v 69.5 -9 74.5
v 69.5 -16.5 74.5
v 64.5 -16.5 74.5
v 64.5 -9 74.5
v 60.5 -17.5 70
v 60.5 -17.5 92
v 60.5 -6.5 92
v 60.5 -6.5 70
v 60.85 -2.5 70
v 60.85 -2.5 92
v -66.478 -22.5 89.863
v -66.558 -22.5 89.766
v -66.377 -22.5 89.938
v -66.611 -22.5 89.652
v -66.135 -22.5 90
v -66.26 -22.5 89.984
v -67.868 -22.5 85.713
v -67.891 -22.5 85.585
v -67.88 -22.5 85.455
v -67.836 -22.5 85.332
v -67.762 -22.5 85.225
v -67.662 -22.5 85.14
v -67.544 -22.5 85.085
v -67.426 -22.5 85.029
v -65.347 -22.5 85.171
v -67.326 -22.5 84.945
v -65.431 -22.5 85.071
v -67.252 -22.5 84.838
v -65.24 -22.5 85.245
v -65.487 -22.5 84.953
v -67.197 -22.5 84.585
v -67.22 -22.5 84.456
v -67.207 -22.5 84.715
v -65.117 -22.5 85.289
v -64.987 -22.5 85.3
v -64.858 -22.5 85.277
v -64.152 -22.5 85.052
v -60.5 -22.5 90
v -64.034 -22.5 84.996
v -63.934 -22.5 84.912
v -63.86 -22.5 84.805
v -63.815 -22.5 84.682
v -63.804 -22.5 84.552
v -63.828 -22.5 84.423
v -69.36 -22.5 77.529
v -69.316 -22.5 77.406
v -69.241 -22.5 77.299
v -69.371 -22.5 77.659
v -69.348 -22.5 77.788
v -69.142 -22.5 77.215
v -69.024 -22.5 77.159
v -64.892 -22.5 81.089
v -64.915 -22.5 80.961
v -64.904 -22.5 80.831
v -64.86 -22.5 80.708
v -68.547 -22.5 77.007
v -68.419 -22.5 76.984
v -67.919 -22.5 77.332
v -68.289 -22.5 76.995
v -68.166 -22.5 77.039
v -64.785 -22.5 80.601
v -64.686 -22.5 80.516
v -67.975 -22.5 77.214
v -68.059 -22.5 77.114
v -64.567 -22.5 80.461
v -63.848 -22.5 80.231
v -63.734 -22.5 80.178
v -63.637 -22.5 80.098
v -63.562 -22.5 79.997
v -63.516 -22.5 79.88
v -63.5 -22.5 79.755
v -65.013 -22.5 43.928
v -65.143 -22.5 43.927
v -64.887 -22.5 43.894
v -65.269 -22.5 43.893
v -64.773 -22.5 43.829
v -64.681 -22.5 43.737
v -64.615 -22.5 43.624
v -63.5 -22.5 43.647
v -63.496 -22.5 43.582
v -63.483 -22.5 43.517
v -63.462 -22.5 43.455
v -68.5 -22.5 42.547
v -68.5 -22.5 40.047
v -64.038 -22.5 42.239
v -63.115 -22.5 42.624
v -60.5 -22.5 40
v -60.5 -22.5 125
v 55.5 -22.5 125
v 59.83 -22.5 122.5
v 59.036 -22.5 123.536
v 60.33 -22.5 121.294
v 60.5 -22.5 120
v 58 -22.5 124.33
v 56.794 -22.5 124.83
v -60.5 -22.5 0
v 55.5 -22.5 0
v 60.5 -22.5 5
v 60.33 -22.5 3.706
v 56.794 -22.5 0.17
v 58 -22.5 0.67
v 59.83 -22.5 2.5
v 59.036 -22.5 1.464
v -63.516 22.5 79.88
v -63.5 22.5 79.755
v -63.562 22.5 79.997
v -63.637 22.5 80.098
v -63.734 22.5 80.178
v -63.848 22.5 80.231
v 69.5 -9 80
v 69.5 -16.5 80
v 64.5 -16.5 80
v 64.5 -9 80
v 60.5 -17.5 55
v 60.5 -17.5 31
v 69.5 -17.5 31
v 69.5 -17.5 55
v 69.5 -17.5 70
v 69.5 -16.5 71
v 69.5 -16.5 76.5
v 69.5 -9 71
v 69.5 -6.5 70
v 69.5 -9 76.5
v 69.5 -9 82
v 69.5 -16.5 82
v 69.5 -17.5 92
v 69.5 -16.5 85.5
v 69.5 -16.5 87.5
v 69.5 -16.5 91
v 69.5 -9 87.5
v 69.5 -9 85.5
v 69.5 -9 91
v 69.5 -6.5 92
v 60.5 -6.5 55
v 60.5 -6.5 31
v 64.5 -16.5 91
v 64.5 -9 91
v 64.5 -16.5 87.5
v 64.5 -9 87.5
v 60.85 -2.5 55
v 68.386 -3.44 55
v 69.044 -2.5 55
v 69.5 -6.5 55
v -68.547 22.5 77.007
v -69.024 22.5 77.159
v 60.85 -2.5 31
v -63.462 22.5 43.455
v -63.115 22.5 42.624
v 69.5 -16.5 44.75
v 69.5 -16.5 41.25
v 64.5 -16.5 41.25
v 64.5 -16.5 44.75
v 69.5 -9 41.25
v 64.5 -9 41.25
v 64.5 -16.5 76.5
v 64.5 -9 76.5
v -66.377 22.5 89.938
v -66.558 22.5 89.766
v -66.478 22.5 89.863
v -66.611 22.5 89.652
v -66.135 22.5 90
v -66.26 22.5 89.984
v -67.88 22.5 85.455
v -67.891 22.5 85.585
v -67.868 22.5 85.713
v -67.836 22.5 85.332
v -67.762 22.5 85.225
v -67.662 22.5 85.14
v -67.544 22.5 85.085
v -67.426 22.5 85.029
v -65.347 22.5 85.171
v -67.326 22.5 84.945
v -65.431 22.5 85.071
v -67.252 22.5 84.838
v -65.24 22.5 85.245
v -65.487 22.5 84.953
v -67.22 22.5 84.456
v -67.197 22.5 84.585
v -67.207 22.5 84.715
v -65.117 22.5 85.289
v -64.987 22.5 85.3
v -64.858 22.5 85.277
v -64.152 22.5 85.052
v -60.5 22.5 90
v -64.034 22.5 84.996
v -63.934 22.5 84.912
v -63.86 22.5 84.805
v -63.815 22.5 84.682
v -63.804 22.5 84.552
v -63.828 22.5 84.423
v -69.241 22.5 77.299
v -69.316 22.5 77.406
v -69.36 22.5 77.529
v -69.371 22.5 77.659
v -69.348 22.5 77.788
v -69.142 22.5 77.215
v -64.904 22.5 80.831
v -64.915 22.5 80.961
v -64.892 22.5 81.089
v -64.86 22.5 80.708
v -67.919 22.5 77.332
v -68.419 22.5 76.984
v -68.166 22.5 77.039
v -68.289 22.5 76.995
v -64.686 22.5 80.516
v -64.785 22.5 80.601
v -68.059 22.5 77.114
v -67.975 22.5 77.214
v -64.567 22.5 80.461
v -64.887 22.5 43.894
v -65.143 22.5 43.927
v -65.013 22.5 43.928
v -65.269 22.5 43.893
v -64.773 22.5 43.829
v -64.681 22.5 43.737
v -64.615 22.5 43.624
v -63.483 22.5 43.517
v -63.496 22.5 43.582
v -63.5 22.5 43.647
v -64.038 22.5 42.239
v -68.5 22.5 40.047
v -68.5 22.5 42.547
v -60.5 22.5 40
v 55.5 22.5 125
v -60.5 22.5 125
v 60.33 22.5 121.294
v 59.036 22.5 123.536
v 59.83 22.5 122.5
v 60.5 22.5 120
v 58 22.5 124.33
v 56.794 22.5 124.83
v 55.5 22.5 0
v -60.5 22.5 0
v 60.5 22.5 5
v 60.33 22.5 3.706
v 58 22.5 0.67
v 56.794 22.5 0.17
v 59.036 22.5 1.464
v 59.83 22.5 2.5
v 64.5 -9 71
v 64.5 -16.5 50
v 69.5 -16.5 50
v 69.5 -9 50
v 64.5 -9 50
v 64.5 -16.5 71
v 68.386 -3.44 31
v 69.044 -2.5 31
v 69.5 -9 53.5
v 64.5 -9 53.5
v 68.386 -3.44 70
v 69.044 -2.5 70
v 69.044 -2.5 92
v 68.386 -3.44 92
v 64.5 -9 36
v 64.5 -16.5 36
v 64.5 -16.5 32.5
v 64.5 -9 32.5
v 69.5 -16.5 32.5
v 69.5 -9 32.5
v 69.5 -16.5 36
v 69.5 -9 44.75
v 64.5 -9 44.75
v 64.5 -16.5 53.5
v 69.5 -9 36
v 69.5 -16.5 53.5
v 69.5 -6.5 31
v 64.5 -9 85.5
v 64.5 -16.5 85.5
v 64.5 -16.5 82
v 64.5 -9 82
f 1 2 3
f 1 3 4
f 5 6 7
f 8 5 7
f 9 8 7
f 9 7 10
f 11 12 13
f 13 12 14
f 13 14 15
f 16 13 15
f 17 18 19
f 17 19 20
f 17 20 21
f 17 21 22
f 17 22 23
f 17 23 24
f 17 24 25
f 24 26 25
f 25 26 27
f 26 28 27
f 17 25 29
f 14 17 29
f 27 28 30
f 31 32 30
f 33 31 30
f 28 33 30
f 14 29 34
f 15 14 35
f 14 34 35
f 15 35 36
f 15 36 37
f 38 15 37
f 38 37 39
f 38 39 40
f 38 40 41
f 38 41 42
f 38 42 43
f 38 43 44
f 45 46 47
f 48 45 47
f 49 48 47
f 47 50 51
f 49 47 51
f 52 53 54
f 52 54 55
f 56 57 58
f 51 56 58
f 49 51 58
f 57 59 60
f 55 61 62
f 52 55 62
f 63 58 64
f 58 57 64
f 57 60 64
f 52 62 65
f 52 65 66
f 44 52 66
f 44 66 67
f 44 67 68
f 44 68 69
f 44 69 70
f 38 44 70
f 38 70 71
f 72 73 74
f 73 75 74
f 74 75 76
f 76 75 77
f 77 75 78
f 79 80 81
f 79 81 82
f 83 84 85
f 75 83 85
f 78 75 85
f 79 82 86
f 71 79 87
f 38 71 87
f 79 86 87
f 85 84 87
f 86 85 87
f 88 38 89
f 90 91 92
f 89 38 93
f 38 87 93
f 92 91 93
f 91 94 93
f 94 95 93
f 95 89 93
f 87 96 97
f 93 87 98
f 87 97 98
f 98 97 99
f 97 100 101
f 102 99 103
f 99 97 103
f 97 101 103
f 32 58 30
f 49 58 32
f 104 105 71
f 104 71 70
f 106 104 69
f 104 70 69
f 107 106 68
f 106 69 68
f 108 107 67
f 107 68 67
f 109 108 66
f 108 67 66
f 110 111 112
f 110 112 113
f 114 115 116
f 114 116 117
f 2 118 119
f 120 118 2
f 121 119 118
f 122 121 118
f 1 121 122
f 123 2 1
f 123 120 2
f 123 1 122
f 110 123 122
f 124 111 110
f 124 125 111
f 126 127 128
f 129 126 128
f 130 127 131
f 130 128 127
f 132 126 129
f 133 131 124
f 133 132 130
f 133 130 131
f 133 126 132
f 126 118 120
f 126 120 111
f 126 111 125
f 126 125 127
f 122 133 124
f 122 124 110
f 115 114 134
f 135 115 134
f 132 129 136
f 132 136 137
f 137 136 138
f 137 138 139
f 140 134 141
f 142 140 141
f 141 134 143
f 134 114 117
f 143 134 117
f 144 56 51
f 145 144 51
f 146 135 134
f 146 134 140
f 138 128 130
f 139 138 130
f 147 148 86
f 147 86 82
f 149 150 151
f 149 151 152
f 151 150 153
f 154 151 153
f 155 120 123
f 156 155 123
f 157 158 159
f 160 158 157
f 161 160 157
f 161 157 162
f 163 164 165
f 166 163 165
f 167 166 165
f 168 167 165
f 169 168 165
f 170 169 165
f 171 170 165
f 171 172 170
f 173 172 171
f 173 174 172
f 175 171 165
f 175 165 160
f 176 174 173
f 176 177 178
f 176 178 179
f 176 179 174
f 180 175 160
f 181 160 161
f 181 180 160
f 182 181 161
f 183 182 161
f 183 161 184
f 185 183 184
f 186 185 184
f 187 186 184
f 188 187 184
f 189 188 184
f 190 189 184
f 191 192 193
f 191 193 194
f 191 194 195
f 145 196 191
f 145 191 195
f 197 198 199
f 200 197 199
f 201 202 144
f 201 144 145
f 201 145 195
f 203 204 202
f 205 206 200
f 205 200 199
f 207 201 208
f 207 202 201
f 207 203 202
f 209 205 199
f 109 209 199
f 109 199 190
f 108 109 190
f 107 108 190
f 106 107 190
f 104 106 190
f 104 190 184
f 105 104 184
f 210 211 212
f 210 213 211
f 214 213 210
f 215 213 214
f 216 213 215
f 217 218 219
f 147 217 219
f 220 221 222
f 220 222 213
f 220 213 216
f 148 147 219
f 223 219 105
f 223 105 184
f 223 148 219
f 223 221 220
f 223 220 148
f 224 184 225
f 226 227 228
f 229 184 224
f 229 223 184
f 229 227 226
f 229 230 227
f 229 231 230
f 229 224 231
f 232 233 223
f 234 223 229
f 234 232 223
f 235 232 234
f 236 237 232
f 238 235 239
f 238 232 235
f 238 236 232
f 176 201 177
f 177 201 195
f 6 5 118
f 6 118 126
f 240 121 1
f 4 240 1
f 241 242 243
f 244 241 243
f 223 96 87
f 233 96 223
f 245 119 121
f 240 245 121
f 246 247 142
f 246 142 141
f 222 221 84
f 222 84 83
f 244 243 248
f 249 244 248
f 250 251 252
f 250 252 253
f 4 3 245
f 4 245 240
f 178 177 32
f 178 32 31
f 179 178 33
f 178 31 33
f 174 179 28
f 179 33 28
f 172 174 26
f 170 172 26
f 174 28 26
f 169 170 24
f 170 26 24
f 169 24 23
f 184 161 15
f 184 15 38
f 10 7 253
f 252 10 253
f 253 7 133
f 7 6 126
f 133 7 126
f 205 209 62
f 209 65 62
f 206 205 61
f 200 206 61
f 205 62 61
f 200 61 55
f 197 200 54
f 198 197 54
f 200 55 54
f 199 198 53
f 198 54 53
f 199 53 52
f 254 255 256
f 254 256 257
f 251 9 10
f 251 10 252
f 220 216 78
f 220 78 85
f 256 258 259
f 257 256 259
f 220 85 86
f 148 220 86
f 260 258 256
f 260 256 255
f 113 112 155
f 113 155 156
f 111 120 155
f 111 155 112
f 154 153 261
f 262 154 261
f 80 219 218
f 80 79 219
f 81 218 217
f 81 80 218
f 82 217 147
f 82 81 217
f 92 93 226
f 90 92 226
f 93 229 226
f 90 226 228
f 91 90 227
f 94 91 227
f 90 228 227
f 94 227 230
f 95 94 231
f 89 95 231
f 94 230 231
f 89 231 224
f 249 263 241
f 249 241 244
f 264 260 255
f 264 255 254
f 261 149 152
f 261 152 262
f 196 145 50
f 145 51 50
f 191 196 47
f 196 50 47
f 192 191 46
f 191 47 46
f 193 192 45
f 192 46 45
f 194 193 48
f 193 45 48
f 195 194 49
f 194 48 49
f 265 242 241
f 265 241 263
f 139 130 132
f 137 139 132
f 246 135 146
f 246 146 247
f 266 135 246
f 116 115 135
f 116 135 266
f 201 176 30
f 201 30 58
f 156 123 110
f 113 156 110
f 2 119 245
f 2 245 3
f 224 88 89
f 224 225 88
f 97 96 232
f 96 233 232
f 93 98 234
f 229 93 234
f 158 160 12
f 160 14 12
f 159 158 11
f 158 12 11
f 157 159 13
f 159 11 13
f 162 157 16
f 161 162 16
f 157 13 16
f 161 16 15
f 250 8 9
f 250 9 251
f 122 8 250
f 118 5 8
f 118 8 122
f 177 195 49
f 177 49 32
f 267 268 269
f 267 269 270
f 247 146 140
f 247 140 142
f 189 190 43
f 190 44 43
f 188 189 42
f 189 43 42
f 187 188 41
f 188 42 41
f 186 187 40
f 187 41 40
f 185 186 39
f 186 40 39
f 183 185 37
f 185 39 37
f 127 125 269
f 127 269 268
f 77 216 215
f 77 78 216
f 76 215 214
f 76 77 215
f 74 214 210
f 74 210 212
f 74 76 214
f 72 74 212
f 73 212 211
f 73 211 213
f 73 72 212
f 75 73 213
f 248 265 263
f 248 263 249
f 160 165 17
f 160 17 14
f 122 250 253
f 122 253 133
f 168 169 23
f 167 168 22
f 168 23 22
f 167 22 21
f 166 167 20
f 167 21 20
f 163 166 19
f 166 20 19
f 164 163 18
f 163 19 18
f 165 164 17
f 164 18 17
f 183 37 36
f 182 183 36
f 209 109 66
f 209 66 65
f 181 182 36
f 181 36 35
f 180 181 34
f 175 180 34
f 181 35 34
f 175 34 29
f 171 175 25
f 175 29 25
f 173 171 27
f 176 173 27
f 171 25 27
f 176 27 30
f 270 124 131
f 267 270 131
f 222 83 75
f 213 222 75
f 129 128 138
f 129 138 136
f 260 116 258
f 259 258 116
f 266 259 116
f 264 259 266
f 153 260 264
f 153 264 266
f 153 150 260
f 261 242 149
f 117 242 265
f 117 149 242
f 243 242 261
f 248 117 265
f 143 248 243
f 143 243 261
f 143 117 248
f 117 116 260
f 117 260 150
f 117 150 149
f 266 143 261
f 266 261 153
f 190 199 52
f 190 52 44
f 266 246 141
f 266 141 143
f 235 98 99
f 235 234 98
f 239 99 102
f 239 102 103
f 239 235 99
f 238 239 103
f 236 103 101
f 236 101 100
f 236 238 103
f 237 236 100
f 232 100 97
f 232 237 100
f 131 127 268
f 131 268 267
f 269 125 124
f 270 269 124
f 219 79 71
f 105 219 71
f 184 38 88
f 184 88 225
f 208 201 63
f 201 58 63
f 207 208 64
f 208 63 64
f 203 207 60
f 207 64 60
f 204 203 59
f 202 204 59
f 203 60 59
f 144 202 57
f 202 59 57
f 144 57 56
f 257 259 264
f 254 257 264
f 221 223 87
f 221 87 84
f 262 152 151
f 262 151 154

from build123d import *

# Parameters (mm, degrees)
F0_W      = 121
F0_H      = 45
F1_DEPTH  = 125
F2_R      = 5
F3_W      = 11
F3_H      = 22
F4_DEPTH  = 9
F3_H_2    = 24
F6_DEPTH  = 22
F8_DEPTH  = 24
F9_W      = 7.5
F9_H      = 3.5
F10_DEPTH = 5
F11_DEPTH = 5
F13_DEPTH = 45
F14_R     = 0.5
F15_R     = 0.49999


# Not quite as in the source:
# - a fillet or chamfer is up to 0.001 mm smaller than in the source, because OpenCascade refuses the exact size
# - a feature names something its author has since deleted; it is built from what else it names


with BuildPart() as f1:
    # F0 (on Top) → F1 (new body)
    with BuildSketch(Plane.XY):
        Rectangle(F0_W, F0_H)
    extrude(amount=F1_DEPTH)

    # F2
    f2_edges = [f1.edges().sort_by_distance(p)[0] for p in [
        (60.5, 0, 125),
        (60.5, 0, 0),
    ]]
    fillet(f2_edges, radius=F2_R)

    # F12 (on face) → F13 (join, through all)
    with BuildSketch(Plane(origin=(0, 22.5, 0), x_dir=(-1, 0, 0), z_dir=(0, 1, 0))):
        Polygon((60.5, 90), (60.5, 40), (68.4998644438, 40.0465712465), (68.4998644438, 42.5465712465), (64.8077652628, 44.0855331166), (64.0382843277, 42.2394835261), (63.1152595325, 42.6242239936), (63.5, 43.5472487889), (63.5, 80.1200936495), (65.0437947471, 80.6128124606), (63.6755676946, 84.8997641436), (65.3345620006, 85.4292501414), (68.0710161057, 76.8553467754), (69.5, 77.3114224596), (67.067596351, 84.9326698961), (68.0202522806, 85.2367203522), (66.5, 90), align=None)
    extrude(amount=-F13_DEPTH)

    # F14
    f14_edges = [f1.edges().sort_by_distance(p)[0] for p in [
        (-67.067596, 0, 84.93267),
        (-63.675568, 0, 84.899764),
        (-63.5, 0, 80.120094),
    ]]
    fillet(f14_edges, radius=F14_R)

    # F15 (radius 0.5 in the source; OpenCascade refuses exactly that, so slightly less here)
    f15_edges = [f1.edges().sort_by_distance(p)[0] for p in [
        (-68.020252, 0, 85.23672),
        (-69.5, 0, 77.311422),
        (-68.071016, 0, 76.855347),
        (-65.334562, 0, 85.42925),
        (-66.5, 0, 90),
        (-65.043795, 0, 80.612812),
        (-64.807765, 0, 44.085533),
        (-63.5, 0, 43.547249),
    ]]
    fillet(f15_edges, radius=F15_R)


with BuildPart() as f4:
    # F3 (on face) → F4 (new body)
    with BuildSketch(Plane.YZ.offset(60.5)):
        with Locations((-12, 81)):
            Rectangle(F3_W, F3_H)
    extrude(amount=F4_DEPTH)

    # F5 (on face) → F6 (join, through all)
    with BuildSketch(Plane(origin=(0, 0, 70), x_dir=(1, 0, 0), z_dir=(0, 0, -1))):
        Polygon((68.3861392063, 3.4396926208), (69.5, 6.5), (60.5, 6.5), (60.8499546541, 2.5), (68.0441190629, 2.5), align=None)
        Polygon((69.0441190629, 2.5), (68.3861392063, 3.4396926208), (68.0441190629, 2.5), align=None)
    extrude(amount=-F6_DEPTH)

    # F9 (on face) → F11 (cut)
    with BuildSketch(Plane.YZ.offset(69.5)):
        with Locations((-12.75, 72.75)):
            Rectangle(F9_W, F9_H)
        with Locations((-12.75, 78.25)):
            Rectangle(F9_W, F9_H)
        with Locations((-12.75, 83.75)):
            Rectangle(F9_W, F9_H)
        with Locations((-12.75, 89.25)):
            Rectangle(F9_W, F9_H)
    extrude(amount=-F11_DEPTH, mode=Mode.SUBTRACT)


with BuildPart() as f4b:
    # F3 (on face) → F4, piece 2 (new body)
    with BuildSketch(Plane.YZ.offset(60.5)):
        with Locations((-12, 43)):
            Rectangle(F3_W, F3_H_2)
    extrude(amount=F4_DEPTH)

    # F7 (on face) → F8 (join, through all)
    with BuildSketch(Plane(origin=(0, 0, 31), x_dir=(1, 0, 0), z_dir=(0, 0, -1))):
        Polygon((68.3861392063, 3.4396926208), (69.5, 6.5), (60.5, 6.5), (60.8499546541, 2.5), (68.0441190629, 2.5), align=None)
        Polygon((69.0441190629, 2.5), (68.3861392063, 3.4396926208), (68.0441190629, 2.5), align=None)
    extrude(amount=-F8_DEPTH)

    # F9 (on face) → F10 (cut)
    with BuildSketch(Plane.YZ.offset(69.5)):
        with Locations((-12.75, 34.25)):
            Rectangle(F9_W, F9_H)
        with Locations((-12.75, 43)):
            Rectangle(F9_W, F9_H)
        with Locations((-12.75, 51.75)):
            Rectangle(F9_W, F9_H)
    extrude(amount=-F10_DEPTH, mode=Mode.SUBTRACT)


solid = Compound([f1.part, f4.part, f4b.part])
